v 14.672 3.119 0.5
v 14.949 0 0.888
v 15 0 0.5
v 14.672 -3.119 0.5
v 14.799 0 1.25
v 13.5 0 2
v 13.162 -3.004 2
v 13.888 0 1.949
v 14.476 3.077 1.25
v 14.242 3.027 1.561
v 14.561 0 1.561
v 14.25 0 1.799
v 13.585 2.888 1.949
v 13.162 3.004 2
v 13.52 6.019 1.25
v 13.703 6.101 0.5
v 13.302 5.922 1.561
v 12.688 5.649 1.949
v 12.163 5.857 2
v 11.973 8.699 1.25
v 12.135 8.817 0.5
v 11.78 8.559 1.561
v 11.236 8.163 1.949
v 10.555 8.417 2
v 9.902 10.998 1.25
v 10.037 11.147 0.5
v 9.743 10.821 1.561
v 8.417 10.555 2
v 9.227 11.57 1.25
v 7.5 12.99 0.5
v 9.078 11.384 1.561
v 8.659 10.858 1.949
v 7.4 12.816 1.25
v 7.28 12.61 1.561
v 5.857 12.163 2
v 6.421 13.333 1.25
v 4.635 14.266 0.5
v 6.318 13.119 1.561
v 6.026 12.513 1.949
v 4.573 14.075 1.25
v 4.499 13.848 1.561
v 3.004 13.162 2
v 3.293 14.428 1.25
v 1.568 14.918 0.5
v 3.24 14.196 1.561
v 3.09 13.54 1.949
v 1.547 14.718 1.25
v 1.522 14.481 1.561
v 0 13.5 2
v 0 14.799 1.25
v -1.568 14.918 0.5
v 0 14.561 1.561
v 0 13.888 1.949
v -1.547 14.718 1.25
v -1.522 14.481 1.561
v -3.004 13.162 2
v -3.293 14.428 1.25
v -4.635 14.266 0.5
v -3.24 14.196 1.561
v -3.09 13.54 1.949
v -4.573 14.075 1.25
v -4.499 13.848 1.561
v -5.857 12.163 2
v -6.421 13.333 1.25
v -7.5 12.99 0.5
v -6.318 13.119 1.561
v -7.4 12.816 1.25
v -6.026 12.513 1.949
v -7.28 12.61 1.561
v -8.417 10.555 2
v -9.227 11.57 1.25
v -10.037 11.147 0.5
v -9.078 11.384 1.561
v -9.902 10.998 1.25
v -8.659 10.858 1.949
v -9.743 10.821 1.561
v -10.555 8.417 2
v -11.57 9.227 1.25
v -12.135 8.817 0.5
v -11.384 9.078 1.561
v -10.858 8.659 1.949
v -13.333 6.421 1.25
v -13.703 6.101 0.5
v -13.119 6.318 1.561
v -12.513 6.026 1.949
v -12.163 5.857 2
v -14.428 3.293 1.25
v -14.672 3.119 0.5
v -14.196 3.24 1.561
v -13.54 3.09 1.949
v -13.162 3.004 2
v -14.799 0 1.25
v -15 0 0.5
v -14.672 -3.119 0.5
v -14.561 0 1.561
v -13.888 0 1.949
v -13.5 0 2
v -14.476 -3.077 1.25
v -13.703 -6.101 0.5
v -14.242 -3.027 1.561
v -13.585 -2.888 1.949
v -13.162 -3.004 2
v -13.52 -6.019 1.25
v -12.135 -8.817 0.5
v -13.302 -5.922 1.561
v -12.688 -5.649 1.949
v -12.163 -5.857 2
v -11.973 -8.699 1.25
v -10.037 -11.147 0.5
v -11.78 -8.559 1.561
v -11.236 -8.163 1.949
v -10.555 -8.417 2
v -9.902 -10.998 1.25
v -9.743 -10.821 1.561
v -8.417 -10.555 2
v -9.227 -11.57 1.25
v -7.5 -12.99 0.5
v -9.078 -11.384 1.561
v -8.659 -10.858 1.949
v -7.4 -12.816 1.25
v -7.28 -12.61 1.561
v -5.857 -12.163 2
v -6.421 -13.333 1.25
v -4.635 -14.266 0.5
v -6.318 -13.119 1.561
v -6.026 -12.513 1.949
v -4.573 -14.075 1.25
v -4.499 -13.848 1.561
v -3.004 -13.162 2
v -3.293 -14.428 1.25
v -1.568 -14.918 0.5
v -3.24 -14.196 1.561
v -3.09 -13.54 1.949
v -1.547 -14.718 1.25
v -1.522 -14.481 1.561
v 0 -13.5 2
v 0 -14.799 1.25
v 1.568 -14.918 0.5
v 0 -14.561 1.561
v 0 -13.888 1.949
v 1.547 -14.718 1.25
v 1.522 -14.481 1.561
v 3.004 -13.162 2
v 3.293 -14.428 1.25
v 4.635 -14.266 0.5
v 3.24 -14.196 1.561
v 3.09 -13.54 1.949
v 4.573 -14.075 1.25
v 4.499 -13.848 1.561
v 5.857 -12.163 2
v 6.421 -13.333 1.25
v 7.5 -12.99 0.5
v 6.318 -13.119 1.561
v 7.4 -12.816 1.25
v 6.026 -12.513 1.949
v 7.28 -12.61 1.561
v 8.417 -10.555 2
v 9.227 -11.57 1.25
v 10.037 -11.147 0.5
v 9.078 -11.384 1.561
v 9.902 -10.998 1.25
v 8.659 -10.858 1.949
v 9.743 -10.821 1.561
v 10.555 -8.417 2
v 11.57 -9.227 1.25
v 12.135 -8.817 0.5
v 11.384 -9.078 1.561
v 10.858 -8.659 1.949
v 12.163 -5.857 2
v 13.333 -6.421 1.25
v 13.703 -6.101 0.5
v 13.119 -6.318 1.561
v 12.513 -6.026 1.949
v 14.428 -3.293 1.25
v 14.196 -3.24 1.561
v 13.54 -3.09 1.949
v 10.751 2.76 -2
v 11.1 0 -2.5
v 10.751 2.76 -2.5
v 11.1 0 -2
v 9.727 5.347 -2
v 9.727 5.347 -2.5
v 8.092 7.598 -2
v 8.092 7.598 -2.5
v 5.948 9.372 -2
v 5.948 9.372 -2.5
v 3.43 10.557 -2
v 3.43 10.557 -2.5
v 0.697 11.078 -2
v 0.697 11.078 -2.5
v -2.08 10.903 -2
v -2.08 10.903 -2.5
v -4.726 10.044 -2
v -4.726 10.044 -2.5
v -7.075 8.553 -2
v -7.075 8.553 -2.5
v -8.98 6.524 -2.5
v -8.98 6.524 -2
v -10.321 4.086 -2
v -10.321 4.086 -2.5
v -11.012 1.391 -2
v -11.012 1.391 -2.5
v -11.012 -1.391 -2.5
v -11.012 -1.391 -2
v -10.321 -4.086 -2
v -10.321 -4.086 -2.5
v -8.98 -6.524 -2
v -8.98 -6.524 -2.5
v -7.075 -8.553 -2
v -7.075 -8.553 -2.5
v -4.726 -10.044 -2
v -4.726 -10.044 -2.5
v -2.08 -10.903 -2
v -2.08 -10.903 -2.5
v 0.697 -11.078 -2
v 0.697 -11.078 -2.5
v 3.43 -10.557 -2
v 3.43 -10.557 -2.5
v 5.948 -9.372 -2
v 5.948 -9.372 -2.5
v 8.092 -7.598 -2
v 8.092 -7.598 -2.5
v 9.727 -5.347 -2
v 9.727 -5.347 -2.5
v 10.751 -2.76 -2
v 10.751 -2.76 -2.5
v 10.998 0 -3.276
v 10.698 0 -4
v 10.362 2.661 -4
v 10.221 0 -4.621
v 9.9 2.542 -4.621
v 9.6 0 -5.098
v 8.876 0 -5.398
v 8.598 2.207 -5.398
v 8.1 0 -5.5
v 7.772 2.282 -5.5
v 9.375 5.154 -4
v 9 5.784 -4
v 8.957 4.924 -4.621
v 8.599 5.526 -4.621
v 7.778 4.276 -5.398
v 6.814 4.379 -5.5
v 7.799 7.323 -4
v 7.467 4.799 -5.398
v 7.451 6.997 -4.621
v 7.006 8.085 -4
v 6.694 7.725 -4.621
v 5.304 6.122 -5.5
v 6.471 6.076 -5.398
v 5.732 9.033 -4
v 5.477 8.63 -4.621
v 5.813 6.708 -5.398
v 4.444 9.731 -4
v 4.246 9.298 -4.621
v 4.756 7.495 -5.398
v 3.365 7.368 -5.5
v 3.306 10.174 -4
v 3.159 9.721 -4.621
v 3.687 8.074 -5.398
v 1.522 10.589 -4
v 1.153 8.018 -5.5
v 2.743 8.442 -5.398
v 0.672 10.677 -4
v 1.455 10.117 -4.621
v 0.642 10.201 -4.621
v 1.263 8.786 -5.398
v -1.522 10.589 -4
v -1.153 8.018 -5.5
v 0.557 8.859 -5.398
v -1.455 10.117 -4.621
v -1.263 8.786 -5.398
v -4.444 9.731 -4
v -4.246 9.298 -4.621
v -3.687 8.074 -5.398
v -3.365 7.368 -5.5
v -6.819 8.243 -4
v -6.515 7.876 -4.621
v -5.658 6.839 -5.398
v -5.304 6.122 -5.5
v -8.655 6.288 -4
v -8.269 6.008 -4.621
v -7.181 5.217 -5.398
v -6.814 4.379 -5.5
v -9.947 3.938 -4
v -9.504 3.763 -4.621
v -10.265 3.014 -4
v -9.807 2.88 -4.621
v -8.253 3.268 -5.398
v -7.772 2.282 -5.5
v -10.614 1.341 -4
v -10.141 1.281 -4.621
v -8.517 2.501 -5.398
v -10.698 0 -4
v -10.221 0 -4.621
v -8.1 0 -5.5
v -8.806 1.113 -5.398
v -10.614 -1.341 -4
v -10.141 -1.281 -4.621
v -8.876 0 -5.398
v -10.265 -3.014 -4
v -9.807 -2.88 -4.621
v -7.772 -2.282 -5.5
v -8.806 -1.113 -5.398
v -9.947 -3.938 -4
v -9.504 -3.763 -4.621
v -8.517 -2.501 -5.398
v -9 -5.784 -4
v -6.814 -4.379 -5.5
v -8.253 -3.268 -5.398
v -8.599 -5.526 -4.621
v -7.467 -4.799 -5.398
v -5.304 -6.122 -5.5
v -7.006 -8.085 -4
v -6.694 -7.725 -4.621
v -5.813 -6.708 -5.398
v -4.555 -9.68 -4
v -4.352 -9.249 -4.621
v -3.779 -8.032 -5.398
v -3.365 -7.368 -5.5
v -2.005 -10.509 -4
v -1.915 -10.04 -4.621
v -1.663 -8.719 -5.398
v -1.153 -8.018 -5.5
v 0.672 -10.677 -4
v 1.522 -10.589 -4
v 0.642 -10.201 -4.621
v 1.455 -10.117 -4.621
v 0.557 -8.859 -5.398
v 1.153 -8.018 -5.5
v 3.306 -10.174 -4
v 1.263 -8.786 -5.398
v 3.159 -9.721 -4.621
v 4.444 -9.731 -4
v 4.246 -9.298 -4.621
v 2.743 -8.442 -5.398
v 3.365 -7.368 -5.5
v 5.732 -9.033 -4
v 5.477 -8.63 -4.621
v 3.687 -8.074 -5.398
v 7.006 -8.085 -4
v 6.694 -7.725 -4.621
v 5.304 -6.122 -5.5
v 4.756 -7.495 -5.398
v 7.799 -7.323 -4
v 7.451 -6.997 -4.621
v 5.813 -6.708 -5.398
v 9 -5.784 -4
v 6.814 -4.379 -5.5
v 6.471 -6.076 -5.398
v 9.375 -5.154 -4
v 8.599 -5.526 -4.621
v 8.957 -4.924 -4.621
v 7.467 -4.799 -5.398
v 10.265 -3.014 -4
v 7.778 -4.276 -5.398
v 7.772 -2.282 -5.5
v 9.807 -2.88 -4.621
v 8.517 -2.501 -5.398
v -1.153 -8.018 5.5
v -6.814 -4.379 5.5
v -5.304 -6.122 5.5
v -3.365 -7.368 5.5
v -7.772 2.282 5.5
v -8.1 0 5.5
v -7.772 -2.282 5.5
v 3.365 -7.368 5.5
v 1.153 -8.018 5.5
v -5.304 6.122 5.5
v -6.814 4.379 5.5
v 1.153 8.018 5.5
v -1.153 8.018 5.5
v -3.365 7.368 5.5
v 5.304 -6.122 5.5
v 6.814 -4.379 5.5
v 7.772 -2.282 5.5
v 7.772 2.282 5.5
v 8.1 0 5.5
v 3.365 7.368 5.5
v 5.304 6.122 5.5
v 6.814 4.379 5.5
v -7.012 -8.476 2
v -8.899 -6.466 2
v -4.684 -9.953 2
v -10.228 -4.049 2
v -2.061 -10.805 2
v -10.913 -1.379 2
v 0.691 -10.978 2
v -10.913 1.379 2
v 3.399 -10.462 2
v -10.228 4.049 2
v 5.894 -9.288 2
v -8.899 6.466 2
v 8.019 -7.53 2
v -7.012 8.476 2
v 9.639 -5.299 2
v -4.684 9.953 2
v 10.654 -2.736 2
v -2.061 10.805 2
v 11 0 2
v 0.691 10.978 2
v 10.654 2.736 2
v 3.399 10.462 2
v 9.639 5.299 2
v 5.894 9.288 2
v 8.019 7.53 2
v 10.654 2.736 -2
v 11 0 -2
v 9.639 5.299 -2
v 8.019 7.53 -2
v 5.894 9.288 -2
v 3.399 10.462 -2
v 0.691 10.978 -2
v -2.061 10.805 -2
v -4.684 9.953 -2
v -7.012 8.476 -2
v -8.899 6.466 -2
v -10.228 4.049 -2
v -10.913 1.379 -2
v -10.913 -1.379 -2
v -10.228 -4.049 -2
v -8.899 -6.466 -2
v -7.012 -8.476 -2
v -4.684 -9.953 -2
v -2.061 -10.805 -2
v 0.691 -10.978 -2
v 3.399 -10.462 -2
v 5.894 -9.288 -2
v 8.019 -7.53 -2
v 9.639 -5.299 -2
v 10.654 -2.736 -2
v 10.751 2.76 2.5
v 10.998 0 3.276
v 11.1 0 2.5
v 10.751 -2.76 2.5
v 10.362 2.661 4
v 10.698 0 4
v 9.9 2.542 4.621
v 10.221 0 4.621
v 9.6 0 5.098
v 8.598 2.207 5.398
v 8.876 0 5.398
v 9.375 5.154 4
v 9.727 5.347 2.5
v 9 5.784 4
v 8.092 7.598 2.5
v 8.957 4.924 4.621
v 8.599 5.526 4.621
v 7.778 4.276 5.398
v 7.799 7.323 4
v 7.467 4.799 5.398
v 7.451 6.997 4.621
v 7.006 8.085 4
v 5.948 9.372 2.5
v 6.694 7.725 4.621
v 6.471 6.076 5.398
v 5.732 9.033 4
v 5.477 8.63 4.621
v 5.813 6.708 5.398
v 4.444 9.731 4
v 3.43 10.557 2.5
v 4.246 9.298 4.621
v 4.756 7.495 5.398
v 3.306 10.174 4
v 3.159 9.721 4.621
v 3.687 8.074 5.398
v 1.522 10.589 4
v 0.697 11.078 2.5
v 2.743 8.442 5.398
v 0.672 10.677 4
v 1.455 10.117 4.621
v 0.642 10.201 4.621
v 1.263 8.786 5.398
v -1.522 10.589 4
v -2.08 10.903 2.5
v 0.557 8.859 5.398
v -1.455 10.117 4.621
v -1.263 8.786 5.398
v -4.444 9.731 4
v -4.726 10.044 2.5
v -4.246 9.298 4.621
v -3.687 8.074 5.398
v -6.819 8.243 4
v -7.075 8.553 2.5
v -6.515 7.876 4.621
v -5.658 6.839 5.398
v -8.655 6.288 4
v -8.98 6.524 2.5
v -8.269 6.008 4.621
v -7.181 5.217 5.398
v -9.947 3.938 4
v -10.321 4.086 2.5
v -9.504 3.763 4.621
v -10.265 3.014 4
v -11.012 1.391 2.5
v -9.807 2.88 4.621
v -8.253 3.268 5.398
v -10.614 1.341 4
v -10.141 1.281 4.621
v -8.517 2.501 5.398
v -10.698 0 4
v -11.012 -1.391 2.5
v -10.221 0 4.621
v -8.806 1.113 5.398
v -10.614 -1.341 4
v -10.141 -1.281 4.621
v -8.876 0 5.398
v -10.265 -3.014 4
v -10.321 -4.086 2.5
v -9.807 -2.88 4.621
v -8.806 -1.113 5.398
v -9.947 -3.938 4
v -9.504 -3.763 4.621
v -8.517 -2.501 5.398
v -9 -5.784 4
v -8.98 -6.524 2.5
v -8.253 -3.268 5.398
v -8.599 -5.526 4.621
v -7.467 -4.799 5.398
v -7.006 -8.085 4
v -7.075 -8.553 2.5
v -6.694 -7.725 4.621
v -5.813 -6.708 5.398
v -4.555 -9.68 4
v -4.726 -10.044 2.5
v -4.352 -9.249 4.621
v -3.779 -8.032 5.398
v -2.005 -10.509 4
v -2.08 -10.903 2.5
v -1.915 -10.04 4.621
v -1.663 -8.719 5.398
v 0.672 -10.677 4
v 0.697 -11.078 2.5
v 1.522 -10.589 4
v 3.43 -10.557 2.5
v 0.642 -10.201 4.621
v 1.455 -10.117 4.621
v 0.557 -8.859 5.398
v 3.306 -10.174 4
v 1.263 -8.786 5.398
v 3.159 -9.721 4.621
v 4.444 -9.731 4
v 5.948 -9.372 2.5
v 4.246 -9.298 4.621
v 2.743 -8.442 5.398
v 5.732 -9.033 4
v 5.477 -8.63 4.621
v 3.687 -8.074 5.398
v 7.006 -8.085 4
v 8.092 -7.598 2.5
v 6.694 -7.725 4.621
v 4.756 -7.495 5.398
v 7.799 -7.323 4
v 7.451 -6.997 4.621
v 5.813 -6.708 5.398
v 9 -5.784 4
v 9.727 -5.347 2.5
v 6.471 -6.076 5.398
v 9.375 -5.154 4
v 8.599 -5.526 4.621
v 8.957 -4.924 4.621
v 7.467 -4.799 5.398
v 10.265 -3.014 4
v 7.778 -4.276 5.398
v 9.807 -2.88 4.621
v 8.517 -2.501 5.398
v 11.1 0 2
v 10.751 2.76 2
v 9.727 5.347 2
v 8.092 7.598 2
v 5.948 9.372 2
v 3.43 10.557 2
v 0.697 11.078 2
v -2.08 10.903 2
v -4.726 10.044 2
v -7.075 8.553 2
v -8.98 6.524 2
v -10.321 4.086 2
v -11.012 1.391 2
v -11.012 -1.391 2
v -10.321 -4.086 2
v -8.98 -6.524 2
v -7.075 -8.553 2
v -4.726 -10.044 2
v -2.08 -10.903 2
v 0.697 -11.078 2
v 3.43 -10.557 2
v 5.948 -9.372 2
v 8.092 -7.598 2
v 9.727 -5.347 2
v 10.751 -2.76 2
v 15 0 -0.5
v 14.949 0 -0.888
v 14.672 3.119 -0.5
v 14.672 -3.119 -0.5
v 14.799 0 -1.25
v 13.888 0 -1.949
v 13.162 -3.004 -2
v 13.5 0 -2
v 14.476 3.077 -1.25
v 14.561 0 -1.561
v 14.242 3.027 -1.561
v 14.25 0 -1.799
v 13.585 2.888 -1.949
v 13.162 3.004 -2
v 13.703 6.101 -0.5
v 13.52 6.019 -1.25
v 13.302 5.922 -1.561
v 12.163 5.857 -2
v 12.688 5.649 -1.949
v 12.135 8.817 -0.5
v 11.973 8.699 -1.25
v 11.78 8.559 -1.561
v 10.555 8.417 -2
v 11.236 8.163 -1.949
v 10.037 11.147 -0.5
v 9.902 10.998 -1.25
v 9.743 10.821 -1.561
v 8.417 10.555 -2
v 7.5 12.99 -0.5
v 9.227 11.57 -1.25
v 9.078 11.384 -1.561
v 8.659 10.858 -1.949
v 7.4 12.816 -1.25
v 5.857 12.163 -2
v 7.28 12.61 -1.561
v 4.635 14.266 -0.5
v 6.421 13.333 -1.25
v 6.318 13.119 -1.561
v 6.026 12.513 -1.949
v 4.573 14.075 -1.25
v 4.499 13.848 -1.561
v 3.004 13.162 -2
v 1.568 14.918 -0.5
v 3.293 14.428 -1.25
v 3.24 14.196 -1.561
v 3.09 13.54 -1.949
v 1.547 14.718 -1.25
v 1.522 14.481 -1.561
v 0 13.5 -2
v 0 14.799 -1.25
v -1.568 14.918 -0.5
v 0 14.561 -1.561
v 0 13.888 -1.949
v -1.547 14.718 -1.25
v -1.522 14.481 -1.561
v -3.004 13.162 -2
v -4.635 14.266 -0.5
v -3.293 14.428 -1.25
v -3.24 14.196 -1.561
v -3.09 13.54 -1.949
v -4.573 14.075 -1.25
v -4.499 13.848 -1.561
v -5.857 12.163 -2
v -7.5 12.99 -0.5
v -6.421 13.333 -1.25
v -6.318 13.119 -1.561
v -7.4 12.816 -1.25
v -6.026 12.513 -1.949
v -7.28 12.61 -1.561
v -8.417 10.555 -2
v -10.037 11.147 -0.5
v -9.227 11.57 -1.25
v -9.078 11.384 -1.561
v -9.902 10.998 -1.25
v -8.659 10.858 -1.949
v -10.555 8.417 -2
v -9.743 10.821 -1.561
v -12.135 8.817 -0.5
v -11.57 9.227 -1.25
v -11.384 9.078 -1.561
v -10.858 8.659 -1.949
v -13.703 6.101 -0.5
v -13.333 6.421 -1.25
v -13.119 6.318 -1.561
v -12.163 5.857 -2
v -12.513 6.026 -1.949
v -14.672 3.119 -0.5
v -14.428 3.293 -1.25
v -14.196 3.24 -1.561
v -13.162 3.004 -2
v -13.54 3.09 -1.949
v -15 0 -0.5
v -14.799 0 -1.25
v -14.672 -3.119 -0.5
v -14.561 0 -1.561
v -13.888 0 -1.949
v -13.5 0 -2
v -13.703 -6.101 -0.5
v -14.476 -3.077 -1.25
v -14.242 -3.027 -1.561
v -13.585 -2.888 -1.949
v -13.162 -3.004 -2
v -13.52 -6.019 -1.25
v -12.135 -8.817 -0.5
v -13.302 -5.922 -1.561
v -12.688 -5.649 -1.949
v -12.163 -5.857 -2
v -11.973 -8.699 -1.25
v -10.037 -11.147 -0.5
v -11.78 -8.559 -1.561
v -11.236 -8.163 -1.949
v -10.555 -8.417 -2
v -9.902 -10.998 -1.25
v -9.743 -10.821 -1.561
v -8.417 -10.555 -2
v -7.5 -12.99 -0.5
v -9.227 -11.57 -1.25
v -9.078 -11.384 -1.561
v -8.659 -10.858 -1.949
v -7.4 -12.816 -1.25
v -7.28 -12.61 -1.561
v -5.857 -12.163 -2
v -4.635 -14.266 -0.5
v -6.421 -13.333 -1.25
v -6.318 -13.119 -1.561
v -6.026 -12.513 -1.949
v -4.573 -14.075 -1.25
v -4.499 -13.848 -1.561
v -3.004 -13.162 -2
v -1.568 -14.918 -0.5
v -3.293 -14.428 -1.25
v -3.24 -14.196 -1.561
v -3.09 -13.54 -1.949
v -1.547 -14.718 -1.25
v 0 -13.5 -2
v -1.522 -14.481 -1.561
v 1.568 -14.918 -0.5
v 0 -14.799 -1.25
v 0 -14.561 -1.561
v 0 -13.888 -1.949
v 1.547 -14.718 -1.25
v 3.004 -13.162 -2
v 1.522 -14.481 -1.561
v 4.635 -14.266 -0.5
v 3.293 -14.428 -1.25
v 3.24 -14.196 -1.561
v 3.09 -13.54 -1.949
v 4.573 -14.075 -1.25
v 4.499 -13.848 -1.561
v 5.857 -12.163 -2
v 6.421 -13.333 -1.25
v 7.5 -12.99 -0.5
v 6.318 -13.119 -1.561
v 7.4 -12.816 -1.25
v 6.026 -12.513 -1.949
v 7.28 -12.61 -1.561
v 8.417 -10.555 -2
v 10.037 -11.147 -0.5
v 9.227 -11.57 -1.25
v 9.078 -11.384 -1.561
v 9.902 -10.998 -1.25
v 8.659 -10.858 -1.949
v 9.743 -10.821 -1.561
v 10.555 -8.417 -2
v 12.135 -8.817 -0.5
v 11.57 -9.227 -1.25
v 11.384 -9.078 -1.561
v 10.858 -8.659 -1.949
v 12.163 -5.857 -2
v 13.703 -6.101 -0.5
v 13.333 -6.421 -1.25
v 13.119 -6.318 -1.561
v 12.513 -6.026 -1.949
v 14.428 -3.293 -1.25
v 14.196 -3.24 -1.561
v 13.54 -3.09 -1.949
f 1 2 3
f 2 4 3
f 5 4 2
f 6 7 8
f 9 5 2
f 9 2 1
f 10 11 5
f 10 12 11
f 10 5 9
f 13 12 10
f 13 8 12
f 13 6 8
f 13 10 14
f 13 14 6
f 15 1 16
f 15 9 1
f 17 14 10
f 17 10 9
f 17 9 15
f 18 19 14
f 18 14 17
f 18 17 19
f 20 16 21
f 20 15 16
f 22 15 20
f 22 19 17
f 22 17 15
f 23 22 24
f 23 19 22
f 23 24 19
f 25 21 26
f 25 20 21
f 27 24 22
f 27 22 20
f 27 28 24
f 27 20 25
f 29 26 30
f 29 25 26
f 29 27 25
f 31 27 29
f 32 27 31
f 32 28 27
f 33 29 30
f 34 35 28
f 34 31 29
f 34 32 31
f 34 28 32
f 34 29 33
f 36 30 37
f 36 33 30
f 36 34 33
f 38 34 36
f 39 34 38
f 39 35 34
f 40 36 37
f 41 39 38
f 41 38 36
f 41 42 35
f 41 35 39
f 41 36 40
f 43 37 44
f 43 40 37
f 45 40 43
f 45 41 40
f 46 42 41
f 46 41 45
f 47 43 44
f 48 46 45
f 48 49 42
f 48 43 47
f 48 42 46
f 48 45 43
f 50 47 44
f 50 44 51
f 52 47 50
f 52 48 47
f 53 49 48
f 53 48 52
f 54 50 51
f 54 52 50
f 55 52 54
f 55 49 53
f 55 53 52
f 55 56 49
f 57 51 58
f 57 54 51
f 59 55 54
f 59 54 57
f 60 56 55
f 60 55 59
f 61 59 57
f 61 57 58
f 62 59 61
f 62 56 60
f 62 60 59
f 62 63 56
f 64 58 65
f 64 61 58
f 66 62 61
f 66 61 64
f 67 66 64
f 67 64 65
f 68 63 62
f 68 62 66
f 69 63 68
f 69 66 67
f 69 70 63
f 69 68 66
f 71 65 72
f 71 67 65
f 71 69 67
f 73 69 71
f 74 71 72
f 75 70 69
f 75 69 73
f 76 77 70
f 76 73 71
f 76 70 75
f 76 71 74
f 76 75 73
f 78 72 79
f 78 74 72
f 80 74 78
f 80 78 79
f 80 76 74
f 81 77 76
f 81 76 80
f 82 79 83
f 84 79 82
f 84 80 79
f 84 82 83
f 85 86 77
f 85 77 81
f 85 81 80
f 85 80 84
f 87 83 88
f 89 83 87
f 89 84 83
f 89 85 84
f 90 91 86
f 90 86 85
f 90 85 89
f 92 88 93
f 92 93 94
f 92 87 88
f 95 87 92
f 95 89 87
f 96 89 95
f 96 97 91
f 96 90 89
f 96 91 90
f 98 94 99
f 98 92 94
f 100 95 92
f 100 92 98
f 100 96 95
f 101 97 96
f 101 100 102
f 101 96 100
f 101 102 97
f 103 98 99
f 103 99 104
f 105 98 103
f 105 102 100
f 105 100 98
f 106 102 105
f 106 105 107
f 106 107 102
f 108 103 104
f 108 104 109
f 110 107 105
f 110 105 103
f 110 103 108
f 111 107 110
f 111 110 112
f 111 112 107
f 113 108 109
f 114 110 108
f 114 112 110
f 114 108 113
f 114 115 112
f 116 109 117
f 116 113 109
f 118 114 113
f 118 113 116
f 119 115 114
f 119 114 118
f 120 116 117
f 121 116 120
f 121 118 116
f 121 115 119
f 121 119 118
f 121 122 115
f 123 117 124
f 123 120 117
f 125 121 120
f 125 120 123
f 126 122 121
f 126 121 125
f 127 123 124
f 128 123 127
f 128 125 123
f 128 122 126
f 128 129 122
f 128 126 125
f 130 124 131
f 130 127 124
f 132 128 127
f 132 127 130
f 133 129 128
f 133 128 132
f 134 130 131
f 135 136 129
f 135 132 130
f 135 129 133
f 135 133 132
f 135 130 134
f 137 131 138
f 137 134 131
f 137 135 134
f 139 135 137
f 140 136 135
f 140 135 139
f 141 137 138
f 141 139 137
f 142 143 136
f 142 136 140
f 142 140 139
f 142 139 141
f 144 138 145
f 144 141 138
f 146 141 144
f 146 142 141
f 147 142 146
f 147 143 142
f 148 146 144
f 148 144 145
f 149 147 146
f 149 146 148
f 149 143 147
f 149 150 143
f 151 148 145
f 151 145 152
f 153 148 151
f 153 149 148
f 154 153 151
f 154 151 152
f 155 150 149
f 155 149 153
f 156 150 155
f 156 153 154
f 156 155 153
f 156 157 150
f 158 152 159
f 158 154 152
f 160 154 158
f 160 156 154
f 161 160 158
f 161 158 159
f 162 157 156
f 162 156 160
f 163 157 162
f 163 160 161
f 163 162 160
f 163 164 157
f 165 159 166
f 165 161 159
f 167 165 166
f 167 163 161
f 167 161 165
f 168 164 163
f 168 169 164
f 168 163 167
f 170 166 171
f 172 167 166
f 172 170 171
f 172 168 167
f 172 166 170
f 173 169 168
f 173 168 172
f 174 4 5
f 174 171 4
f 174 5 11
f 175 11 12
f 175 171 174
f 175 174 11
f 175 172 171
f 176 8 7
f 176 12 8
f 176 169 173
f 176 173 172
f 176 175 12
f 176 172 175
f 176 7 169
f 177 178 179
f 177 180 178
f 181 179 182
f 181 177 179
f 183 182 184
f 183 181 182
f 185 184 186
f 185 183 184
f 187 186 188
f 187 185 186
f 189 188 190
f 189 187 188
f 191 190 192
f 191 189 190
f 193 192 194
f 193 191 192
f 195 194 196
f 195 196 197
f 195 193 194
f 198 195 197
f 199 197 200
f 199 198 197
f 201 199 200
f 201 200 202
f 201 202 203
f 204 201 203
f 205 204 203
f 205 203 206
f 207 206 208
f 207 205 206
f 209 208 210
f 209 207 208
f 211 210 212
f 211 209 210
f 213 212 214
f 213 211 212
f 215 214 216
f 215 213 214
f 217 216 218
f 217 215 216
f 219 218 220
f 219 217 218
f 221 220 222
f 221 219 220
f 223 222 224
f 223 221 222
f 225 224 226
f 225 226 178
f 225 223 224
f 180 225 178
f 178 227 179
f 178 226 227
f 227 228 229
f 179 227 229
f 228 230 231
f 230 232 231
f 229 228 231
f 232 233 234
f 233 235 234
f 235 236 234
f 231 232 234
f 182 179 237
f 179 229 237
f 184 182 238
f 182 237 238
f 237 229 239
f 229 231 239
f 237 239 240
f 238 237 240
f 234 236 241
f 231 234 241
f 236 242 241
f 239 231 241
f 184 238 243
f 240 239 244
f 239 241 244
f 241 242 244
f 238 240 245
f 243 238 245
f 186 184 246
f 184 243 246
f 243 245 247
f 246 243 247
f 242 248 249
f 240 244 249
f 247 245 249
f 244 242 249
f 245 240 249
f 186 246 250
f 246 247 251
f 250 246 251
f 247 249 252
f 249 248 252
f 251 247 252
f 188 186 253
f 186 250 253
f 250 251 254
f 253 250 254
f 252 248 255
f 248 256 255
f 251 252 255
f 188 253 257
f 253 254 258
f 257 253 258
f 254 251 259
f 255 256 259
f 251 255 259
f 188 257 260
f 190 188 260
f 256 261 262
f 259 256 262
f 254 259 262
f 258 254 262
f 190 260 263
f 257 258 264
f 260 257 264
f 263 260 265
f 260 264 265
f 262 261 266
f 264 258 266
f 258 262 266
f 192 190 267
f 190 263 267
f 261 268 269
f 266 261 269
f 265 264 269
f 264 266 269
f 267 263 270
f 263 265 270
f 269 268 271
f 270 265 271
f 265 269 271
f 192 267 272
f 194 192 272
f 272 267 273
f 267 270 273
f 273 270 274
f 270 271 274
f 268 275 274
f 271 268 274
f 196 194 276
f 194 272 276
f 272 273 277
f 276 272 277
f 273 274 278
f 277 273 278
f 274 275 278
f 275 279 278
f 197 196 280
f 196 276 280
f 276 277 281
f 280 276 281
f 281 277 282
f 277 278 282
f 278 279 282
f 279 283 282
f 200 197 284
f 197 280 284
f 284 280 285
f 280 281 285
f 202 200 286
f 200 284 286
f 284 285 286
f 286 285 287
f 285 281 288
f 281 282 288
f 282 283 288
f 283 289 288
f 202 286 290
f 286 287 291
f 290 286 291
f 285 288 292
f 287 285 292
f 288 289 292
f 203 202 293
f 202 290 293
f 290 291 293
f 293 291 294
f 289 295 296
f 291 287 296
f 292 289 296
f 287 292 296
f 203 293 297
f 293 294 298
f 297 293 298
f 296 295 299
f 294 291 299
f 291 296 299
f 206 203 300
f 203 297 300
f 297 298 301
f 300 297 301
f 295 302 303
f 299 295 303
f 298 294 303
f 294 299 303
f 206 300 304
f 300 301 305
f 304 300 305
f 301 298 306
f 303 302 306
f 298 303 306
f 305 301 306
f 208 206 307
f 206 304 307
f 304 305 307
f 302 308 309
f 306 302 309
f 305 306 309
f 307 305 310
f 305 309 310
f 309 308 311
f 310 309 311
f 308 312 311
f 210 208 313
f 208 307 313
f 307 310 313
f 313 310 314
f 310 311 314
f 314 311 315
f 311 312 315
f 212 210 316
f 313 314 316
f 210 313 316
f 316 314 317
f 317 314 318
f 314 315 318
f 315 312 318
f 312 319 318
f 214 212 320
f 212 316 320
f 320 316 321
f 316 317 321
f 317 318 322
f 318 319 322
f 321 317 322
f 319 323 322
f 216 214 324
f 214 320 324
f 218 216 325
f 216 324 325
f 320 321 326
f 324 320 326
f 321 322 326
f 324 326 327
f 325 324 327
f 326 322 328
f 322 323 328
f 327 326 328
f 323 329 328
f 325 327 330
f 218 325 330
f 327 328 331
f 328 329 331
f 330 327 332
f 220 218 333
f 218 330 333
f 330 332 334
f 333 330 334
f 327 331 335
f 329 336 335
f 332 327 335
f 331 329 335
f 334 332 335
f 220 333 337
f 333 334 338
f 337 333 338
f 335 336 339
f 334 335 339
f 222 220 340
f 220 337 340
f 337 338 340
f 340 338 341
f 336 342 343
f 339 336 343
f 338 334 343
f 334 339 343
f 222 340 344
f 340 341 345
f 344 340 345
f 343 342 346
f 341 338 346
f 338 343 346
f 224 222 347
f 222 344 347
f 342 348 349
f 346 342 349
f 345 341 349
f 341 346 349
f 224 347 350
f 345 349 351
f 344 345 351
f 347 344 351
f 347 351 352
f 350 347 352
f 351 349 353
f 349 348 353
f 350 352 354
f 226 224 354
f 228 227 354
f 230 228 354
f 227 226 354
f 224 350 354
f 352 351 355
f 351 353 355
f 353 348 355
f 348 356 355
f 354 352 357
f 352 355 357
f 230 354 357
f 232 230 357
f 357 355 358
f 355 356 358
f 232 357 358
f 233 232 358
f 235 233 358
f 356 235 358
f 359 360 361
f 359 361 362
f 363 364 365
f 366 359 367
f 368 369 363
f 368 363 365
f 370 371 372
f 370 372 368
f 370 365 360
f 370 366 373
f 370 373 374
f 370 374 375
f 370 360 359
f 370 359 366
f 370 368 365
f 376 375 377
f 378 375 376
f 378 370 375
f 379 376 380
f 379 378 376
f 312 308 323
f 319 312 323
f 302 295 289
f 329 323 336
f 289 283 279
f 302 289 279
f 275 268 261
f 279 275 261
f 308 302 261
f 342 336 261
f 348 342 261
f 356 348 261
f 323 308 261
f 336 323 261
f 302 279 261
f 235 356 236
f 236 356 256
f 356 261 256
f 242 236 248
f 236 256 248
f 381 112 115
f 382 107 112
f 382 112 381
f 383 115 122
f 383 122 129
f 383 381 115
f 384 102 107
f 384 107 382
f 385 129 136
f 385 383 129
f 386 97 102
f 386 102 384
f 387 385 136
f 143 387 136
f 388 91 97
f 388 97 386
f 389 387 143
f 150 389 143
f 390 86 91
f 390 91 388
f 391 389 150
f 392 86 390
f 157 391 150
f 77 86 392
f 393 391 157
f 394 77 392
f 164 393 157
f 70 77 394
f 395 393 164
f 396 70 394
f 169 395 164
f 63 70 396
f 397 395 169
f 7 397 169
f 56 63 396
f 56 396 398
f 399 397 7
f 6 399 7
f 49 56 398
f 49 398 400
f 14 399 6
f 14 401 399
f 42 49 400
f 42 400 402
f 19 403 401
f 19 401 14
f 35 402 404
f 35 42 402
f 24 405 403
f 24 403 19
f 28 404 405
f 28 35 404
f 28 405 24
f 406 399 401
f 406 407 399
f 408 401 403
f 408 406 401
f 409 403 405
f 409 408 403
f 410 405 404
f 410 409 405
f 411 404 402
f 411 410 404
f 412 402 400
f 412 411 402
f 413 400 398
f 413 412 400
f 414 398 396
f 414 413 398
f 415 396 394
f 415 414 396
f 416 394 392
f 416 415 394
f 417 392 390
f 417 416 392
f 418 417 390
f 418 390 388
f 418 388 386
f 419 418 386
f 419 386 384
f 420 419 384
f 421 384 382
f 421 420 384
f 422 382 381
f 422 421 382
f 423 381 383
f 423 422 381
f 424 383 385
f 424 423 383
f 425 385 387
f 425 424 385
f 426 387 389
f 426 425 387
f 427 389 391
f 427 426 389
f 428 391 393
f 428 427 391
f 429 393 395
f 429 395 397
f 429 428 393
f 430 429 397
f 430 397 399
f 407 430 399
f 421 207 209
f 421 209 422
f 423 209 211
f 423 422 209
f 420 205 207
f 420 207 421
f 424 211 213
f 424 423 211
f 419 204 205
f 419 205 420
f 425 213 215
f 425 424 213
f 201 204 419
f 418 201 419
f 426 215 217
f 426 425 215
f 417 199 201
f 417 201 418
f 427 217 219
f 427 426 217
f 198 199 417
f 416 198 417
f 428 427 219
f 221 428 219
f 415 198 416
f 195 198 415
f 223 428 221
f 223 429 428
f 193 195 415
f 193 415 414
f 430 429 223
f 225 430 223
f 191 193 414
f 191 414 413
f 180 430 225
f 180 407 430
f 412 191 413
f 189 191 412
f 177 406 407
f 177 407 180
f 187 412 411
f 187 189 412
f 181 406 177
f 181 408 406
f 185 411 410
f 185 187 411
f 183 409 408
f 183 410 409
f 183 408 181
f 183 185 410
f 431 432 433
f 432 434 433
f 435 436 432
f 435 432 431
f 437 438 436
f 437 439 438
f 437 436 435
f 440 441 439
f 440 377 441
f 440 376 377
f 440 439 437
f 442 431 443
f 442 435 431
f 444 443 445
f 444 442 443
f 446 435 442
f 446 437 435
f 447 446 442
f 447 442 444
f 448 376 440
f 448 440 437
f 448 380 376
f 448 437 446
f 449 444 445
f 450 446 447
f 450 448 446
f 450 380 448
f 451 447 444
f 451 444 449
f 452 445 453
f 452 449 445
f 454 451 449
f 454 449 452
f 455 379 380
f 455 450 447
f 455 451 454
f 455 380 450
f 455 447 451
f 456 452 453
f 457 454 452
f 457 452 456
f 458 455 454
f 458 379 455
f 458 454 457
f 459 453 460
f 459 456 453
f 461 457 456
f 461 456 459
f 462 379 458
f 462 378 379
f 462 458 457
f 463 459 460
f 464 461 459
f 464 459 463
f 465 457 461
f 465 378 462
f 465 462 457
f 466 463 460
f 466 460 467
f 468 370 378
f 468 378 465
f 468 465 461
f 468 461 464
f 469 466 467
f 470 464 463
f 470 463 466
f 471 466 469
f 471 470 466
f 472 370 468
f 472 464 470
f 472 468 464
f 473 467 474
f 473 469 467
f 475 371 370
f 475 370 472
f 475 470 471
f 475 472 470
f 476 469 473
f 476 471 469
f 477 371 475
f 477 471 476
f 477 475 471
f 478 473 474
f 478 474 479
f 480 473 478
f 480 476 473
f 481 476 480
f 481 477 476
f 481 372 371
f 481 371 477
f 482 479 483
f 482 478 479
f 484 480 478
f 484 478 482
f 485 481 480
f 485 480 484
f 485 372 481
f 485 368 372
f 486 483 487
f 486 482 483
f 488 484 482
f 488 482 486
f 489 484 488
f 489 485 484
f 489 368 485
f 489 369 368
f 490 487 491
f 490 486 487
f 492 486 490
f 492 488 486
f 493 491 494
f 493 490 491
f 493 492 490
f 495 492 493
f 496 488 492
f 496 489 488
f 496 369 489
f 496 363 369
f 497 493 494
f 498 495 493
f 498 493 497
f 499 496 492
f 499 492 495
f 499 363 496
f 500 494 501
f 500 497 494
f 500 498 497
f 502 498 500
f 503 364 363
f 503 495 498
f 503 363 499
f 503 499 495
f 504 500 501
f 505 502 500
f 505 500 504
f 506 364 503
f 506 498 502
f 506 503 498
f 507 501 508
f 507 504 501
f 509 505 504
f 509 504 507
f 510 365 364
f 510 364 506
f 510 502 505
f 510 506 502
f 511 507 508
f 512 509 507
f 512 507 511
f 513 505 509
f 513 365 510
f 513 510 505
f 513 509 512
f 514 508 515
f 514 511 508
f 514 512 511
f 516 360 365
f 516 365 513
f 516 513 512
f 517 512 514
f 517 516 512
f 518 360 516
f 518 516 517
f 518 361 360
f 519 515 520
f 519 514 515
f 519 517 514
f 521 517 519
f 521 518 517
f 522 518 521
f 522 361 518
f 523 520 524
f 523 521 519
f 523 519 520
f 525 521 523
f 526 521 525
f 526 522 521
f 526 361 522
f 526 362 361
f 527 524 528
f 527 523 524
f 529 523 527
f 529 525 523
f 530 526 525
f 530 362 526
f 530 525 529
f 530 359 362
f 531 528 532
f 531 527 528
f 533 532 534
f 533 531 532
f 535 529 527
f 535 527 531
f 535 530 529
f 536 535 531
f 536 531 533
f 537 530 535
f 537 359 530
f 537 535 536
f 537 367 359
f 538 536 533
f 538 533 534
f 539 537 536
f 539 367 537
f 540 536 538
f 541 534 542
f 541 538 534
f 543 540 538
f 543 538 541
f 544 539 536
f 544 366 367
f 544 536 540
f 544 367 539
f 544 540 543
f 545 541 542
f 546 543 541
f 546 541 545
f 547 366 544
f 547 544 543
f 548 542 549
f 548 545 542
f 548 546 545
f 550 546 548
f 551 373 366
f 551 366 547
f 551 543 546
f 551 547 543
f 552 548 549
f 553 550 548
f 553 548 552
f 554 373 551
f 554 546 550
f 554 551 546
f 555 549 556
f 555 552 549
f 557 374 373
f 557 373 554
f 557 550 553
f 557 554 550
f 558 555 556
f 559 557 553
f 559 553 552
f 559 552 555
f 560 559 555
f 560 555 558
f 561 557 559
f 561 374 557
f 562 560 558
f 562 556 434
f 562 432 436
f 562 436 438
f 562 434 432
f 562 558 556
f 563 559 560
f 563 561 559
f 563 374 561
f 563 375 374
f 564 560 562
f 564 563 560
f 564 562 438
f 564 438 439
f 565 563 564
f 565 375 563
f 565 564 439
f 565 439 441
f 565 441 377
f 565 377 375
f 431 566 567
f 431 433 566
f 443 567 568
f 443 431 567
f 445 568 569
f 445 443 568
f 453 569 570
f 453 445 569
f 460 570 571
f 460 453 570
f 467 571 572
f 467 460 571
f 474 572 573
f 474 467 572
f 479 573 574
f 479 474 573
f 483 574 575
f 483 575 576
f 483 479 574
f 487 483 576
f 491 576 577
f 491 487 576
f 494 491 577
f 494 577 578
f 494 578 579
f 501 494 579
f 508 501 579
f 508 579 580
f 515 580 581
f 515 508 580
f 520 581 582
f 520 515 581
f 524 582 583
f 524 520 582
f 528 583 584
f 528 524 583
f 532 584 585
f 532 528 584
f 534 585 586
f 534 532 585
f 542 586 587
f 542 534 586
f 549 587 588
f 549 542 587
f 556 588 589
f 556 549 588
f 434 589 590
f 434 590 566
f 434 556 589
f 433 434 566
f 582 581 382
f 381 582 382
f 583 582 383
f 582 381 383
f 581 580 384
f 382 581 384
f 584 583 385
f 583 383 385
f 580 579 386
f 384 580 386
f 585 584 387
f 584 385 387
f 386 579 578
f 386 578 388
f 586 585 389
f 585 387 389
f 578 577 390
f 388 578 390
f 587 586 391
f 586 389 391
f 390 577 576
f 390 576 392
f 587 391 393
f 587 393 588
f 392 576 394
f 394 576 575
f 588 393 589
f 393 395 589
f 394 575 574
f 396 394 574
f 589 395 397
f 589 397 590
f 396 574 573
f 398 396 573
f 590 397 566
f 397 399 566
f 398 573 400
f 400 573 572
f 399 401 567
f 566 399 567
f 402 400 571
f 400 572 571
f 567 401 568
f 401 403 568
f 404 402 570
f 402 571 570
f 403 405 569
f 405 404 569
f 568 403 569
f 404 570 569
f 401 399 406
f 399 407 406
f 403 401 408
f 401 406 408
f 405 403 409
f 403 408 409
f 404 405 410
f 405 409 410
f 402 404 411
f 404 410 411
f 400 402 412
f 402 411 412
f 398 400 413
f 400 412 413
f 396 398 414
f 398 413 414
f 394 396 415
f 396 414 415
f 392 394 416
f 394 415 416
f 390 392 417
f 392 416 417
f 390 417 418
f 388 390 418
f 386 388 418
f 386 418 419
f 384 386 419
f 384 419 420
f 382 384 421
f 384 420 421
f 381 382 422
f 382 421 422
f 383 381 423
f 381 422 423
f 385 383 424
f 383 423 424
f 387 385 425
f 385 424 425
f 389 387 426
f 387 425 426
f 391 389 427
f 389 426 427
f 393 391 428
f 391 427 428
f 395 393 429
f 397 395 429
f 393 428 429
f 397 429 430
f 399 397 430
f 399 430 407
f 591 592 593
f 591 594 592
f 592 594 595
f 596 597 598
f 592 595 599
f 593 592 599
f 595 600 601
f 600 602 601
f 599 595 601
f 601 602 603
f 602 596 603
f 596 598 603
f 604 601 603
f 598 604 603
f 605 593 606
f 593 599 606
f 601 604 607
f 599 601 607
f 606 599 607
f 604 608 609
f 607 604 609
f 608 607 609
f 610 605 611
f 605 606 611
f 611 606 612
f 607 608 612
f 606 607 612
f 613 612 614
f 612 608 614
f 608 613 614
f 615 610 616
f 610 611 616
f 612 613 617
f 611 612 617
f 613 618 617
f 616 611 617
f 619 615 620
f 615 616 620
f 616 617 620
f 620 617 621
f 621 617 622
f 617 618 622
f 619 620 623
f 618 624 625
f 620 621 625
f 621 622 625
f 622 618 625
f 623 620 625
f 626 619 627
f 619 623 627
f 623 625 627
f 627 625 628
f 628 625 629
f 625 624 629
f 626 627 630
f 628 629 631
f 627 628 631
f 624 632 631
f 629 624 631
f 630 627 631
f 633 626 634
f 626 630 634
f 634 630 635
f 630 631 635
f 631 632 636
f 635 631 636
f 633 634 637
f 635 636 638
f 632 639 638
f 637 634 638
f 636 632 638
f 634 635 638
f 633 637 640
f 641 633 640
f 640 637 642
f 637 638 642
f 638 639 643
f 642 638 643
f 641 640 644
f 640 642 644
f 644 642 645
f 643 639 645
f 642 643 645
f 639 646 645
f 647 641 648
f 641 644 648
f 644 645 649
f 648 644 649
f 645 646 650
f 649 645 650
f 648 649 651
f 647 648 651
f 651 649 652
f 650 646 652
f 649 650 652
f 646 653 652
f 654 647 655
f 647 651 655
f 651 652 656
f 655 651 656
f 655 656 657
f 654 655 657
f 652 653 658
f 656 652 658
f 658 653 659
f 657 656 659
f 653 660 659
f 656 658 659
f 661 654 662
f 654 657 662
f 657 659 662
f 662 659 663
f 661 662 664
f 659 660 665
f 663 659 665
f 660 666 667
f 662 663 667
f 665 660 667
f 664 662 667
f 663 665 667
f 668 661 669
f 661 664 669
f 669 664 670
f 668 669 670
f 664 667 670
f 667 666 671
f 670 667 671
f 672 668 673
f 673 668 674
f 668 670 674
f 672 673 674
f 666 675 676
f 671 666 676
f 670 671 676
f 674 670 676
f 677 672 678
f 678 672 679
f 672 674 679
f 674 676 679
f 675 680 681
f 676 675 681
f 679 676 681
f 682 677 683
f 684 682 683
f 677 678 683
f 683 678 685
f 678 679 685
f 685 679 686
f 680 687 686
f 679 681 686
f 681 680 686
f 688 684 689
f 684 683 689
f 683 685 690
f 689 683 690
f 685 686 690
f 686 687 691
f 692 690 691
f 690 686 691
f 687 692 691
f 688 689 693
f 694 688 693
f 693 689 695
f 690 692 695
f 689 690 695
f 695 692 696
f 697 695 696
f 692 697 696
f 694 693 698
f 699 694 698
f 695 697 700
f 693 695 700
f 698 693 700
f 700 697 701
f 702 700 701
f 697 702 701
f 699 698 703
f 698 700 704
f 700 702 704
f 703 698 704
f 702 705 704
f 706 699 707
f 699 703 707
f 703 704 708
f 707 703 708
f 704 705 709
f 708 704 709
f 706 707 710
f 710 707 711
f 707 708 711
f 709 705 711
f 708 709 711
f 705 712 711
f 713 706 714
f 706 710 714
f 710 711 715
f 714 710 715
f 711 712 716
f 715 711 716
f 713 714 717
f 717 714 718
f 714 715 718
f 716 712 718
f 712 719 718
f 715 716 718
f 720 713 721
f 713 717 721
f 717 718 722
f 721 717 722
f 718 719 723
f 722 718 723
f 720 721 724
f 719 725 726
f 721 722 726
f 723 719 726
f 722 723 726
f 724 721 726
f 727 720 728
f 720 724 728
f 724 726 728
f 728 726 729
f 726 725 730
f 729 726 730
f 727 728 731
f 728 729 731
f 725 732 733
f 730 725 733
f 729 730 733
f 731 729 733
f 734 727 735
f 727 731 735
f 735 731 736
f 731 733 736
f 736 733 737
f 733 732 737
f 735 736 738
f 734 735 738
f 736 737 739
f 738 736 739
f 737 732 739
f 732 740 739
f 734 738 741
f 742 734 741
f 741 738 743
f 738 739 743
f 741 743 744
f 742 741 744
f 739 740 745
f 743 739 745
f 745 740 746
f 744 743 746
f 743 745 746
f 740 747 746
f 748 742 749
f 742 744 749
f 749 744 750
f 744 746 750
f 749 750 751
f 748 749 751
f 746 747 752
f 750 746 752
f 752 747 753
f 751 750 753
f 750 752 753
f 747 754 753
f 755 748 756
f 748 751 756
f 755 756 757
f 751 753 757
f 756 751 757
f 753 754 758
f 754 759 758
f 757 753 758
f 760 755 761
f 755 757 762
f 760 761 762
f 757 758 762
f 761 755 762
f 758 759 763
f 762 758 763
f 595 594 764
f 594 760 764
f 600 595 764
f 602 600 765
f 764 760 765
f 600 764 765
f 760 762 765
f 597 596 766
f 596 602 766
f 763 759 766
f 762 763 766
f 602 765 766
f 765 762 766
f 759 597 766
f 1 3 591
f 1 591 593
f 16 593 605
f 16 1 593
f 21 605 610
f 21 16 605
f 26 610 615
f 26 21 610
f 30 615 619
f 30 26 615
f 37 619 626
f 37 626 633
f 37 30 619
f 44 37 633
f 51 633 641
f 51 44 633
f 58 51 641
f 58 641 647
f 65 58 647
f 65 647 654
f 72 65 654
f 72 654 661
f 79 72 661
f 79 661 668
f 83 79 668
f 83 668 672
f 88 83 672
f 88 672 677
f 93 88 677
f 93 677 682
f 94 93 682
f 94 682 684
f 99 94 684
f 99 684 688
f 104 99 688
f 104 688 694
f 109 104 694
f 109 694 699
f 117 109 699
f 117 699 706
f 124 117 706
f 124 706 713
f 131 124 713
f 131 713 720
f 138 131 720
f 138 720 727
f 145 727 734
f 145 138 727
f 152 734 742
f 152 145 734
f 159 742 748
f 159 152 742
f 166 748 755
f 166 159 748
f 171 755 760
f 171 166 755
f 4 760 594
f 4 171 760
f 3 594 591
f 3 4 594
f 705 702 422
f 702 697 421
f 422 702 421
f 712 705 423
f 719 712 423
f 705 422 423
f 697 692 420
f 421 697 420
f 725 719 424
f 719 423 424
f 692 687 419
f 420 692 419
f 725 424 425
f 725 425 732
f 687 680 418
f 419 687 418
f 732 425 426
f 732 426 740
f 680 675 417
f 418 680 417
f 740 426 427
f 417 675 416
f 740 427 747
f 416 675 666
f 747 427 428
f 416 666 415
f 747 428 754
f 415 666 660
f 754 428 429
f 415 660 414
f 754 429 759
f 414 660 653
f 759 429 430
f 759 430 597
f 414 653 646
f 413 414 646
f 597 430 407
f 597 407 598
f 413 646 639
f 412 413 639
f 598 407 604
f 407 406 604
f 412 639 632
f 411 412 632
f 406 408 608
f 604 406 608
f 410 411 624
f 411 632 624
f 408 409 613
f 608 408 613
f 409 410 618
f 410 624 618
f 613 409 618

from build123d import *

# Parameters (mm, degrees)
F2_R     = 15
F2_R_2   = 11
F3_DEPTH = 2
F4_R     = 11.1
F5_DEPTH = 5.5
F6_R     = 3
F9_R     = 1.5


with BuildPart() as f3:
    # F2 (on Top) → F3 (new body, symmetric)
    with BuildSketch(Plane.XY):
        Circle(F2_R)
        Circle(F2_R_2, mode=Mode.SUBTRACT)
    extrude(amount=F3_DEPTH, both=True)


with BuildPart() as f5:
    # F4 (on Top) → F5 (new body, symmetric)
    with BuildSketch(Plane.XY):
        Circle(F4_R)
    extrude(amount=F5_DEPTH, both=True)

    # F6
    f6_edges = [f5.edges().sort_by_distance(p)[0] for p in [
        (-11.1, 0, 5.5),
        (-11.1, 0, -5.5),
    ]]
    fillet(f6_edges, radius=F6_R)


with BuildPart() as f7_1:
    # F7: copy of F3
    add(f3.part)


with BuildPart() as f5_1:
    add(f5.part)

    # F8: cut F7_1
    add(f7_1.part, mode=Mode.SUBTRACT)


with BuildPart() as f3_1:
    add(f3.part)

    # F9
    f9_edges = [f3_1.edges().sort_by_distance(p)[0] for p in [
        (-15, 0, -2),
        (15, 0, 0),
        (-15, 0, 2),
    ]]
    fillet(f9_edges, radius=F9_R)


solid = Compound([f5_1.part, f3_1.part])
